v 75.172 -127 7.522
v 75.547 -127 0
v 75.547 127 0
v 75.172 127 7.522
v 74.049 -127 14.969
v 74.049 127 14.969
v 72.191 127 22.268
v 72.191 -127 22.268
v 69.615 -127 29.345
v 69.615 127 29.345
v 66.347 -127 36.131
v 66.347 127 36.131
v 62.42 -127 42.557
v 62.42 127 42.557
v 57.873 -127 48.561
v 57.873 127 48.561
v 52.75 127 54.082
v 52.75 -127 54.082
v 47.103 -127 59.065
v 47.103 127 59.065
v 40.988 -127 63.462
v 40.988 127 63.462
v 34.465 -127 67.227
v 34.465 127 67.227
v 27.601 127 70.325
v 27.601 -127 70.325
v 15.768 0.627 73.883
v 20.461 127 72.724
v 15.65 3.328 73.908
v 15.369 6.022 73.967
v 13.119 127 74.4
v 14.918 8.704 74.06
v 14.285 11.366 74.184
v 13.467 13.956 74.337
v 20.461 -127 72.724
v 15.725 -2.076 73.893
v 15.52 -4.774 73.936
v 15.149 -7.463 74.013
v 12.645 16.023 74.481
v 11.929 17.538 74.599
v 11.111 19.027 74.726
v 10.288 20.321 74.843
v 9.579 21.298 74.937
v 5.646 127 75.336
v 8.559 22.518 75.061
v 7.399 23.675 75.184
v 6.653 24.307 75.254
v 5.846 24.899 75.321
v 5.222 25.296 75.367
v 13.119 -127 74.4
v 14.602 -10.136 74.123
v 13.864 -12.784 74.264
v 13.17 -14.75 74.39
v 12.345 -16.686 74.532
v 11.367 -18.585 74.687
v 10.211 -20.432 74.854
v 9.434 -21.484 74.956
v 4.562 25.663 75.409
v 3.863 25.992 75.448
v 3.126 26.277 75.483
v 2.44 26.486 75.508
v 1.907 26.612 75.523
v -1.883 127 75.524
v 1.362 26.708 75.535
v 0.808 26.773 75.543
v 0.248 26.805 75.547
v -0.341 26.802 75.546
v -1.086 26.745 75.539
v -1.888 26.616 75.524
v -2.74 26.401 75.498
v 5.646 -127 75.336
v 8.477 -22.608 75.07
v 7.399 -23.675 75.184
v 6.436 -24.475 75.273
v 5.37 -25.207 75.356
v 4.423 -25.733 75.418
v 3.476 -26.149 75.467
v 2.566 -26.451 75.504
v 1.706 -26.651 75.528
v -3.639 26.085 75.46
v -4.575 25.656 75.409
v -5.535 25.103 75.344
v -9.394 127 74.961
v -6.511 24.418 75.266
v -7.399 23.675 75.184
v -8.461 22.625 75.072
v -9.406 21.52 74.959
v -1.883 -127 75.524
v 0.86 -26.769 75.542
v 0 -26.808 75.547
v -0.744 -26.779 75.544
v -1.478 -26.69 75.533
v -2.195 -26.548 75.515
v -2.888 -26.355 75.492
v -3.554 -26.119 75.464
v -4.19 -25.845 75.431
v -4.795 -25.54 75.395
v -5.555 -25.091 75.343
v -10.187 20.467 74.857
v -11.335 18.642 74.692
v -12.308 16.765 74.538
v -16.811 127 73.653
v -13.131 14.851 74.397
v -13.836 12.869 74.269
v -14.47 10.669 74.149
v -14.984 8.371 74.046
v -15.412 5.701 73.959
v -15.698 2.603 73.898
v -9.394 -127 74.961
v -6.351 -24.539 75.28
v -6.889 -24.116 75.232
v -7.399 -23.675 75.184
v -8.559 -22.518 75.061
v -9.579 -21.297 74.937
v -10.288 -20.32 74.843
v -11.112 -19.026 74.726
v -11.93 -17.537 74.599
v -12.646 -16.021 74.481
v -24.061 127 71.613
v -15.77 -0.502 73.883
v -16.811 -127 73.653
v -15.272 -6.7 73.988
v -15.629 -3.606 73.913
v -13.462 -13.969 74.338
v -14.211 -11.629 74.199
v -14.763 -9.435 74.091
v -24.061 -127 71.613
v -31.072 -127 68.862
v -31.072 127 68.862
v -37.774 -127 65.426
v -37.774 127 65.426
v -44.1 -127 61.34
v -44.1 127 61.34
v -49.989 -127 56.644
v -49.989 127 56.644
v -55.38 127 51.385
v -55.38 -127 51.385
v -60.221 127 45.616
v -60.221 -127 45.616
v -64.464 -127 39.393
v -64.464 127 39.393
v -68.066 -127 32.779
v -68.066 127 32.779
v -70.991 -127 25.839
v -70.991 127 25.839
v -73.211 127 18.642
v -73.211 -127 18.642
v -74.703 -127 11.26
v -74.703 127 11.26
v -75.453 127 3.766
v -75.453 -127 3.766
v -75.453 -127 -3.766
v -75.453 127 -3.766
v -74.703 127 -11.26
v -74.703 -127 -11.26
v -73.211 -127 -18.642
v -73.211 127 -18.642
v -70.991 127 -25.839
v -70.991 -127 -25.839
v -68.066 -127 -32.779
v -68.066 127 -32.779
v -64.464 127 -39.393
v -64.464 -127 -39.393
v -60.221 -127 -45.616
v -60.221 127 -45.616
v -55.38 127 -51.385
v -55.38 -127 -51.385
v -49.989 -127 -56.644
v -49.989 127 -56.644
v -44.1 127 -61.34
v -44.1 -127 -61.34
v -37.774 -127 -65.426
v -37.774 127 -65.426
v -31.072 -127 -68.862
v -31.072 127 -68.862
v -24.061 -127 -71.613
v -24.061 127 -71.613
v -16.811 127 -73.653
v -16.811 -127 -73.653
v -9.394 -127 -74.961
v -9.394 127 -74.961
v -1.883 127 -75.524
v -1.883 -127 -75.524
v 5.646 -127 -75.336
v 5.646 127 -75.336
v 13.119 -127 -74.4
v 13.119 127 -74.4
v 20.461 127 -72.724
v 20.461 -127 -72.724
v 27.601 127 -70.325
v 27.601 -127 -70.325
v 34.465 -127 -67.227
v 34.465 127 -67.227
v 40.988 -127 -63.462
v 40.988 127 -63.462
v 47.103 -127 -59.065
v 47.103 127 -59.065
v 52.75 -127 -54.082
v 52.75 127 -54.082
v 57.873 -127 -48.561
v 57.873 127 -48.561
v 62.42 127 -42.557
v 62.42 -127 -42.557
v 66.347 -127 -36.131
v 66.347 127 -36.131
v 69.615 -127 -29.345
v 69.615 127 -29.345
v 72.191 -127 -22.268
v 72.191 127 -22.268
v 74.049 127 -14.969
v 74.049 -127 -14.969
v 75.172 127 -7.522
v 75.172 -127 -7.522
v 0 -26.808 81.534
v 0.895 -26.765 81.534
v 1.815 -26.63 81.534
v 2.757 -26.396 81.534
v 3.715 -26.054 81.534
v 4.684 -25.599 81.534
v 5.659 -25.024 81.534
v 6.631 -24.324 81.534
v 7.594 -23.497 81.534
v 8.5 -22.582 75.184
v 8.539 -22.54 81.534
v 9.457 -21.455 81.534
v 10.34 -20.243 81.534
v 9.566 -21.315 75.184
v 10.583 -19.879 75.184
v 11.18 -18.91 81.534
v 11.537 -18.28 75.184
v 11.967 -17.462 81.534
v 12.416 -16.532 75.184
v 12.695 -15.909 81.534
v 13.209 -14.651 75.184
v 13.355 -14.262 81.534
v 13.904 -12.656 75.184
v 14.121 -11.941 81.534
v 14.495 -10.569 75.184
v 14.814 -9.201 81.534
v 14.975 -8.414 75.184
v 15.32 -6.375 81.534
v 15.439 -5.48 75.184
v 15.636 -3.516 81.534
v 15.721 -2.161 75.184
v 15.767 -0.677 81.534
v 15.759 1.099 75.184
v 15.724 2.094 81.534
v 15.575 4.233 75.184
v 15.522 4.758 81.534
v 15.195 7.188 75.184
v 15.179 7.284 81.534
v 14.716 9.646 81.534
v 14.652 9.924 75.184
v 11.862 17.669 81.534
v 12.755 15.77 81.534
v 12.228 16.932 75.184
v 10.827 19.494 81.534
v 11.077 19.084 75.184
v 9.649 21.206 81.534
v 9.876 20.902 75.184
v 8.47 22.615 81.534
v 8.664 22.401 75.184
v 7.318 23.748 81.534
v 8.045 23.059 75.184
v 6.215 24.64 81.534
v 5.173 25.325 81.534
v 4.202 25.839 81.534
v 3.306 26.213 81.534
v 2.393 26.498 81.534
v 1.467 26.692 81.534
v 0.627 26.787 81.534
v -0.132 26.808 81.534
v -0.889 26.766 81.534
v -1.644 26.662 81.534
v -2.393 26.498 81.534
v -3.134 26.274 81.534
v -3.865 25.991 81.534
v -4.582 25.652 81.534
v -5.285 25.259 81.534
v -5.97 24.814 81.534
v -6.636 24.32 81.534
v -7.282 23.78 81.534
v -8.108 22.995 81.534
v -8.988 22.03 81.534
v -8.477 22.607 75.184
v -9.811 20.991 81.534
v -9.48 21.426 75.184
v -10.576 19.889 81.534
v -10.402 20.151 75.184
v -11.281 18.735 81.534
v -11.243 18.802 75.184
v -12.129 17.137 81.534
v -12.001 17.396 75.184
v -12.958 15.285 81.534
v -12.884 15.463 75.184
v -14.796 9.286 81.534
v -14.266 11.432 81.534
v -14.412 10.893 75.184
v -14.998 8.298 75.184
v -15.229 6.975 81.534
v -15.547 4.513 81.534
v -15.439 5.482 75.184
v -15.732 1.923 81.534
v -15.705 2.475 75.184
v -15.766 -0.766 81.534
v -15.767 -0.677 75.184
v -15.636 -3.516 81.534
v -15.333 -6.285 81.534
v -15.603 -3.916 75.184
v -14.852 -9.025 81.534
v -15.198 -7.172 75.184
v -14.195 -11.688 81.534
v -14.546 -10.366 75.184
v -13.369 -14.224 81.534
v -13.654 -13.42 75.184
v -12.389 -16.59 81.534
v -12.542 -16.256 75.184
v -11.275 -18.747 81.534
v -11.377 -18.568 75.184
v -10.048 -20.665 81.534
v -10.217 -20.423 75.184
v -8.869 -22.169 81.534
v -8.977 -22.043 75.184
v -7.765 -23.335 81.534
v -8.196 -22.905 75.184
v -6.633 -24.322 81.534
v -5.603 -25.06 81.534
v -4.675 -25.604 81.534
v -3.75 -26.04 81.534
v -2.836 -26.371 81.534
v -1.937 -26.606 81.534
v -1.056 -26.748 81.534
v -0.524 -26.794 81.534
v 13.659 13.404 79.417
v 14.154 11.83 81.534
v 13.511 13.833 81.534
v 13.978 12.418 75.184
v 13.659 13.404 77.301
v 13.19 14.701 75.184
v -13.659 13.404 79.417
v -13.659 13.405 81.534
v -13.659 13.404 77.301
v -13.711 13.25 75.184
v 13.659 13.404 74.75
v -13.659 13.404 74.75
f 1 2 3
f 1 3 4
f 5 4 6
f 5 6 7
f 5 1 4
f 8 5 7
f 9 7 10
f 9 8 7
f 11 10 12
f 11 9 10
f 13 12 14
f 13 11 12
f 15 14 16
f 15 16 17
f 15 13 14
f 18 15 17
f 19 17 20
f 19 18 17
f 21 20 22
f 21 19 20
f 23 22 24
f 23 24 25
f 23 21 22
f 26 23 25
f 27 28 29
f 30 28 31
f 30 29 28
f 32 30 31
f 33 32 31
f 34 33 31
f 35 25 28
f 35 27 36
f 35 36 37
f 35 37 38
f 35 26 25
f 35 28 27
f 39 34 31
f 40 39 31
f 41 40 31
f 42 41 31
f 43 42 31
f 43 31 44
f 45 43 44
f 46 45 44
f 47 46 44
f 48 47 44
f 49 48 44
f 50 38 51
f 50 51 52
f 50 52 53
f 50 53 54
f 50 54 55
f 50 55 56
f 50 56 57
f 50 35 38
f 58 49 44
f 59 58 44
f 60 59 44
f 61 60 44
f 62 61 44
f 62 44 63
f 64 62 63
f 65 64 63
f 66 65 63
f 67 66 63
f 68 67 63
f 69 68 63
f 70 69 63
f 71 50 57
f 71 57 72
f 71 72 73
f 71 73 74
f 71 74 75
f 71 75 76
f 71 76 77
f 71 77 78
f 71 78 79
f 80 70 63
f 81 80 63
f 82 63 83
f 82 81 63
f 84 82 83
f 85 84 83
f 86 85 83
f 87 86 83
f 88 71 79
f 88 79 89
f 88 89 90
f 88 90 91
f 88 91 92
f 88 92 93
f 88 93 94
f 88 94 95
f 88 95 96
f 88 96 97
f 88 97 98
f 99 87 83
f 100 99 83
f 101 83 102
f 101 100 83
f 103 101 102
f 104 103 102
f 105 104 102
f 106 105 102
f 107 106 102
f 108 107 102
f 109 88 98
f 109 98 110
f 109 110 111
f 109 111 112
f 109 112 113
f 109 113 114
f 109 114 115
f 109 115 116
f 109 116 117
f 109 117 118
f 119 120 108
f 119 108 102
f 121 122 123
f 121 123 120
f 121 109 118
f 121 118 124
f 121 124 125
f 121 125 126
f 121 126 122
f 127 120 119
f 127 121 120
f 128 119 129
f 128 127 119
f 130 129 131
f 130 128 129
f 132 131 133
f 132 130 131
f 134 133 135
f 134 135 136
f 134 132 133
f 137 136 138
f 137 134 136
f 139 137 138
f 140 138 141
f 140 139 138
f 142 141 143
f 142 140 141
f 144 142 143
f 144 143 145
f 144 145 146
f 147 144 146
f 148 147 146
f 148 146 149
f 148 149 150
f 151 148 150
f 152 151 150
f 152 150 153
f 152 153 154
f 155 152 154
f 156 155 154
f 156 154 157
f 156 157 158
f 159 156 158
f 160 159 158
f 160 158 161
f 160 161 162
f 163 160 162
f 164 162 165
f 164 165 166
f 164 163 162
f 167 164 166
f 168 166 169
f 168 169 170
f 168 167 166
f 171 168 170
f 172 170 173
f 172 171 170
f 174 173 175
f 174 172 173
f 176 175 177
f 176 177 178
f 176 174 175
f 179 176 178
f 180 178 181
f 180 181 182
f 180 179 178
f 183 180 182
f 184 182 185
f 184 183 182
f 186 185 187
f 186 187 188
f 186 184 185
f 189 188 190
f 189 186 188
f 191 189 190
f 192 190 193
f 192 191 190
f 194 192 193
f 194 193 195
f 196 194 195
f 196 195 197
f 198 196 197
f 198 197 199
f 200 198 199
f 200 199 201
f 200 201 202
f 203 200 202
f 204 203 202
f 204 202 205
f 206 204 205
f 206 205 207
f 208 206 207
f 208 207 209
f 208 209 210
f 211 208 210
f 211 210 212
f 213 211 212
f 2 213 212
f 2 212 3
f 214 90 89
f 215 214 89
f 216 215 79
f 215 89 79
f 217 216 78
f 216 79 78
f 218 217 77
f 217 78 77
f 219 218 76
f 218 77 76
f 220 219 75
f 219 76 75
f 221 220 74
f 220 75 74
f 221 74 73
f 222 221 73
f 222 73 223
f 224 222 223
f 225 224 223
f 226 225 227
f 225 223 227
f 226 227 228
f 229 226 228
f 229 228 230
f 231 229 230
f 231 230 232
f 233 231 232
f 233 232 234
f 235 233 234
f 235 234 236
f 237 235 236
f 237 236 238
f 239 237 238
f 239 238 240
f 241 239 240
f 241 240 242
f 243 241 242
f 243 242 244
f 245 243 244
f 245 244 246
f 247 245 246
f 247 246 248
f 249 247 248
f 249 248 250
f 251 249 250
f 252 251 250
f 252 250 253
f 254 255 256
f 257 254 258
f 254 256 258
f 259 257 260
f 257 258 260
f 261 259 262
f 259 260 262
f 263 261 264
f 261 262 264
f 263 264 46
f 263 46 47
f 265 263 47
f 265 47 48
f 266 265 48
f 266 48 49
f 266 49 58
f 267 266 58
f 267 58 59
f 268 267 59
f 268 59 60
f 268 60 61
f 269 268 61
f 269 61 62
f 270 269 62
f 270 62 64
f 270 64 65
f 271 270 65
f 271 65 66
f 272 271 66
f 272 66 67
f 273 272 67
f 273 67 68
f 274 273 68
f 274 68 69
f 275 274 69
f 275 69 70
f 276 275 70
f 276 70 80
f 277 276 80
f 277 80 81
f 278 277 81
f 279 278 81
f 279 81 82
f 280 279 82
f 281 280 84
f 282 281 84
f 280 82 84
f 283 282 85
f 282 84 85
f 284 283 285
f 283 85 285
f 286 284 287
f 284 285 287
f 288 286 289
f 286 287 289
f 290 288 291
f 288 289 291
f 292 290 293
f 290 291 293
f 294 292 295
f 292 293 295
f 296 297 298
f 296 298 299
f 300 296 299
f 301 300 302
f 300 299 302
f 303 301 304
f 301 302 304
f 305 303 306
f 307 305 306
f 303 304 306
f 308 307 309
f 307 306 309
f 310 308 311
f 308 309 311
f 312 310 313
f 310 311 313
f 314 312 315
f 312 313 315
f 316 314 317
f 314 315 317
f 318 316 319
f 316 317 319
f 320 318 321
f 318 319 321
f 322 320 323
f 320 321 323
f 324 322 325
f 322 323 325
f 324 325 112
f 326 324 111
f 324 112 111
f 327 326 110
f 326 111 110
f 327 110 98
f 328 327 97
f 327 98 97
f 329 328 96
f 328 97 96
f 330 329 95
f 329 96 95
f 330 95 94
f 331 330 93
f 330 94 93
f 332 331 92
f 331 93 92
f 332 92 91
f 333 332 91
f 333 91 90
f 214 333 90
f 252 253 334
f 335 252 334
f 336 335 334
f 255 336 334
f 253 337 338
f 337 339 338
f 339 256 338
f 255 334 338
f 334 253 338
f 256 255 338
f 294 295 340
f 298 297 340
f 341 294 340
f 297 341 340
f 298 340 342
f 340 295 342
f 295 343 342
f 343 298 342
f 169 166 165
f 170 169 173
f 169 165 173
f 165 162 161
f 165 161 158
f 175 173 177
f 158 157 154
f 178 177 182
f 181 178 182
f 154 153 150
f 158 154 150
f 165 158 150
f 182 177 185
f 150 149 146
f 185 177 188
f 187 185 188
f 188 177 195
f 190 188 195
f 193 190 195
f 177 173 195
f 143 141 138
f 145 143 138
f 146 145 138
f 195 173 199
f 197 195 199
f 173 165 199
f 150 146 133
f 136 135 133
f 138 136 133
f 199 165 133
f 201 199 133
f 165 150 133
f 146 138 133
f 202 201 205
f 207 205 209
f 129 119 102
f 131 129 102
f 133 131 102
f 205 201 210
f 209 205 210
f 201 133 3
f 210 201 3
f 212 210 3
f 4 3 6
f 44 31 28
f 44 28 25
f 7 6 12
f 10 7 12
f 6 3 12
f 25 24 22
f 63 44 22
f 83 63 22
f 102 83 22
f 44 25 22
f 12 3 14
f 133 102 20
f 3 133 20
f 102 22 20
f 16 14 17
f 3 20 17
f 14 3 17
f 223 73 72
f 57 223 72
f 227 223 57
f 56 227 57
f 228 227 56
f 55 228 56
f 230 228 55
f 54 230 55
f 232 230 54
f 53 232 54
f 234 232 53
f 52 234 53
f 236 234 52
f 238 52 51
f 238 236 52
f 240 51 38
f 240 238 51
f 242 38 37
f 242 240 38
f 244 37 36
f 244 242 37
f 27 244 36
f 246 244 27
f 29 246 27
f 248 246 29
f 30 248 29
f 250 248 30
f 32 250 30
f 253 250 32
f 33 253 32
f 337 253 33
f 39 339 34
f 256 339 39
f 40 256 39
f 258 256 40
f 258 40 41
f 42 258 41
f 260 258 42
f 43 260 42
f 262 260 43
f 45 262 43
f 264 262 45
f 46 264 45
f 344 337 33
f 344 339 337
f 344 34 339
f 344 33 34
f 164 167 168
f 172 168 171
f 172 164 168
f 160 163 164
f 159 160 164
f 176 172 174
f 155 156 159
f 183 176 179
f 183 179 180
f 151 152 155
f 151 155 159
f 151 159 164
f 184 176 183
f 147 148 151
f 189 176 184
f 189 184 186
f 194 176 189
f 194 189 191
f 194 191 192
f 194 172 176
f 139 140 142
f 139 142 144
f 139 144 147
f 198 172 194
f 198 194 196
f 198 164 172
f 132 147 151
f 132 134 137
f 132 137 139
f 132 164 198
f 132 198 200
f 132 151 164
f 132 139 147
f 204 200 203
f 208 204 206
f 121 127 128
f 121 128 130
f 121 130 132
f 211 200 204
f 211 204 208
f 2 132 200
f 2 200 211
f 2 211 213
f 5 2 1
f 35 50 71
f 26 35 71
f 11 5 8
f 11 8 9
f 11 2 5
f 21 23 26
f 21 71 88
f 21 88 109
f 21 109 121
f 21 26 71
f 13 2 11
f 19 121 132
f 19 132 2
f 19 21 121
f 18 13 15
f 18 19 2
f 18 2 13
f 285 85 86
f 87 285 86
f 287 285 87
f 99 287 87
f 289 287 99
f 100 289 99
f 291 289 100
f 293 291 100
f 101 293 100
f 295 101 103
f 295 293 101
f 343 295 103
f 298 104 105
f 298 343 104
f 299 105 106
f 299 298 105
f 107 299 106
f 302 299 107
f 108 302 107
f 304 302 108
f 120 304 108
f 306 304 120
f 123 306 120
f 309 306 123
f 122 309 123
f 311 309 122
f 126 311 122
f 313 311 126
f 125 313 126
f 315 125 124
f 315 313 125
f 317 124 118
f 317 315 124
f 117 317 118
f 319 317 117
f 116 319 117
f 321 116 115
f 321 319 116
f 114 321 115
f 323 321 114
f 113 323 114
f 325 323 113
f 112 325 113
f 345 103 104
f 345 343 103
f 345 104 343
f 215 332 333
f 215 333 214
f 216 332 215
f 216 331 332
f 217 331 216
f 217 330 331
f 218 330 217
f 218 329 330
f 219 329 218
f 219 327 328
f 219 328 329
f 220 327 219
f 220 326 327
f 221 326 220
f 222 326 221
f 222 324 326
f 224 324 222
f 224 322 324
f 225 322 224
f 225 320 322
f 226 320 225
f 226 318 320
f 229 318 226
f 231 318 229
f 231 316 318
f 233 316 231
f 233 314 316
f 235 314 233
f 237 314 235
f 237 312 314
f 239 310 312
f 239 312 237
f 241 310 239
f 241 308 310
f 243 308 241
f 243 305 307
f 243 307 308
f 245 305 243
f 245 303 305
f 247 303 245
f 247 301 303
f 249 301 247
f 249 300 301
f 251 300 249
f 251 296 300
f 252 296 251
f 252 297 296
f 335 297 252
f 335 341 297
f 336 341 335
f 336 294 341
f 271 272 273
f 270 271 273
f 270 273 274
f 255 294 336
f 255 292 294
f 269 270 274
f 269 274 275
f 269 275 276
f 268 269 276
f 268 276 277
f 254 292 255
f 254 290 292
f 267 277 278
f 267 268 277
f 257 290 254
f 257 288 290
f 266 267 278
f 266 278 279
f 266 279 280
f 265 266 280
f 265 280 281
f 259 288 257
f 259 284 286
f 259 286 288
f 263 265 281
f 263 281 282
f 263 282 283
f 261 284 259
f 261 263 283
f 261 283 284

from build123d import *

# Parameters (mm, degrees)
F0_R     = 75.5472350888
F1_DEPTH = 127
F4_DEPTH = 6.35


with BuildPart() as f1:
    # F0 (on Front) → F1 (new body, symmetric)
    with BuildSketch(Plane.XZ):
        Circle(F0_R)
    extrude(amount=F1_DEPTH, both=True)

    # F3 (on offset) → F4 (join, symmetric)
    with BuildSketch(Plane.XY.offset(75.184)):
        with BuildLine():
            add(Edge.make_bspline(
                [(0, -26.8084928393), (27.3186761033, -26.8084928393), (13.6593380516, 13.4042464197), (0, 53.6169856787), (-13.6593380516, 13.4042464197), (-27.3186761033, -26.8084928393), (0, -26.8084928393)],
                knots=[0, 0, 0, 2.0943951024, 2.0943951024, 4.1887902048, 4.1887902048, 6.2831853072, 6.2831853072, 6.2831853072], degree=2, weights=[1, 0.5, 1, 0.5, 1, 0.5, 1]))
        make_face()
    extrude(amount=F4_DEPTH, both=True)


solid = f1.part
